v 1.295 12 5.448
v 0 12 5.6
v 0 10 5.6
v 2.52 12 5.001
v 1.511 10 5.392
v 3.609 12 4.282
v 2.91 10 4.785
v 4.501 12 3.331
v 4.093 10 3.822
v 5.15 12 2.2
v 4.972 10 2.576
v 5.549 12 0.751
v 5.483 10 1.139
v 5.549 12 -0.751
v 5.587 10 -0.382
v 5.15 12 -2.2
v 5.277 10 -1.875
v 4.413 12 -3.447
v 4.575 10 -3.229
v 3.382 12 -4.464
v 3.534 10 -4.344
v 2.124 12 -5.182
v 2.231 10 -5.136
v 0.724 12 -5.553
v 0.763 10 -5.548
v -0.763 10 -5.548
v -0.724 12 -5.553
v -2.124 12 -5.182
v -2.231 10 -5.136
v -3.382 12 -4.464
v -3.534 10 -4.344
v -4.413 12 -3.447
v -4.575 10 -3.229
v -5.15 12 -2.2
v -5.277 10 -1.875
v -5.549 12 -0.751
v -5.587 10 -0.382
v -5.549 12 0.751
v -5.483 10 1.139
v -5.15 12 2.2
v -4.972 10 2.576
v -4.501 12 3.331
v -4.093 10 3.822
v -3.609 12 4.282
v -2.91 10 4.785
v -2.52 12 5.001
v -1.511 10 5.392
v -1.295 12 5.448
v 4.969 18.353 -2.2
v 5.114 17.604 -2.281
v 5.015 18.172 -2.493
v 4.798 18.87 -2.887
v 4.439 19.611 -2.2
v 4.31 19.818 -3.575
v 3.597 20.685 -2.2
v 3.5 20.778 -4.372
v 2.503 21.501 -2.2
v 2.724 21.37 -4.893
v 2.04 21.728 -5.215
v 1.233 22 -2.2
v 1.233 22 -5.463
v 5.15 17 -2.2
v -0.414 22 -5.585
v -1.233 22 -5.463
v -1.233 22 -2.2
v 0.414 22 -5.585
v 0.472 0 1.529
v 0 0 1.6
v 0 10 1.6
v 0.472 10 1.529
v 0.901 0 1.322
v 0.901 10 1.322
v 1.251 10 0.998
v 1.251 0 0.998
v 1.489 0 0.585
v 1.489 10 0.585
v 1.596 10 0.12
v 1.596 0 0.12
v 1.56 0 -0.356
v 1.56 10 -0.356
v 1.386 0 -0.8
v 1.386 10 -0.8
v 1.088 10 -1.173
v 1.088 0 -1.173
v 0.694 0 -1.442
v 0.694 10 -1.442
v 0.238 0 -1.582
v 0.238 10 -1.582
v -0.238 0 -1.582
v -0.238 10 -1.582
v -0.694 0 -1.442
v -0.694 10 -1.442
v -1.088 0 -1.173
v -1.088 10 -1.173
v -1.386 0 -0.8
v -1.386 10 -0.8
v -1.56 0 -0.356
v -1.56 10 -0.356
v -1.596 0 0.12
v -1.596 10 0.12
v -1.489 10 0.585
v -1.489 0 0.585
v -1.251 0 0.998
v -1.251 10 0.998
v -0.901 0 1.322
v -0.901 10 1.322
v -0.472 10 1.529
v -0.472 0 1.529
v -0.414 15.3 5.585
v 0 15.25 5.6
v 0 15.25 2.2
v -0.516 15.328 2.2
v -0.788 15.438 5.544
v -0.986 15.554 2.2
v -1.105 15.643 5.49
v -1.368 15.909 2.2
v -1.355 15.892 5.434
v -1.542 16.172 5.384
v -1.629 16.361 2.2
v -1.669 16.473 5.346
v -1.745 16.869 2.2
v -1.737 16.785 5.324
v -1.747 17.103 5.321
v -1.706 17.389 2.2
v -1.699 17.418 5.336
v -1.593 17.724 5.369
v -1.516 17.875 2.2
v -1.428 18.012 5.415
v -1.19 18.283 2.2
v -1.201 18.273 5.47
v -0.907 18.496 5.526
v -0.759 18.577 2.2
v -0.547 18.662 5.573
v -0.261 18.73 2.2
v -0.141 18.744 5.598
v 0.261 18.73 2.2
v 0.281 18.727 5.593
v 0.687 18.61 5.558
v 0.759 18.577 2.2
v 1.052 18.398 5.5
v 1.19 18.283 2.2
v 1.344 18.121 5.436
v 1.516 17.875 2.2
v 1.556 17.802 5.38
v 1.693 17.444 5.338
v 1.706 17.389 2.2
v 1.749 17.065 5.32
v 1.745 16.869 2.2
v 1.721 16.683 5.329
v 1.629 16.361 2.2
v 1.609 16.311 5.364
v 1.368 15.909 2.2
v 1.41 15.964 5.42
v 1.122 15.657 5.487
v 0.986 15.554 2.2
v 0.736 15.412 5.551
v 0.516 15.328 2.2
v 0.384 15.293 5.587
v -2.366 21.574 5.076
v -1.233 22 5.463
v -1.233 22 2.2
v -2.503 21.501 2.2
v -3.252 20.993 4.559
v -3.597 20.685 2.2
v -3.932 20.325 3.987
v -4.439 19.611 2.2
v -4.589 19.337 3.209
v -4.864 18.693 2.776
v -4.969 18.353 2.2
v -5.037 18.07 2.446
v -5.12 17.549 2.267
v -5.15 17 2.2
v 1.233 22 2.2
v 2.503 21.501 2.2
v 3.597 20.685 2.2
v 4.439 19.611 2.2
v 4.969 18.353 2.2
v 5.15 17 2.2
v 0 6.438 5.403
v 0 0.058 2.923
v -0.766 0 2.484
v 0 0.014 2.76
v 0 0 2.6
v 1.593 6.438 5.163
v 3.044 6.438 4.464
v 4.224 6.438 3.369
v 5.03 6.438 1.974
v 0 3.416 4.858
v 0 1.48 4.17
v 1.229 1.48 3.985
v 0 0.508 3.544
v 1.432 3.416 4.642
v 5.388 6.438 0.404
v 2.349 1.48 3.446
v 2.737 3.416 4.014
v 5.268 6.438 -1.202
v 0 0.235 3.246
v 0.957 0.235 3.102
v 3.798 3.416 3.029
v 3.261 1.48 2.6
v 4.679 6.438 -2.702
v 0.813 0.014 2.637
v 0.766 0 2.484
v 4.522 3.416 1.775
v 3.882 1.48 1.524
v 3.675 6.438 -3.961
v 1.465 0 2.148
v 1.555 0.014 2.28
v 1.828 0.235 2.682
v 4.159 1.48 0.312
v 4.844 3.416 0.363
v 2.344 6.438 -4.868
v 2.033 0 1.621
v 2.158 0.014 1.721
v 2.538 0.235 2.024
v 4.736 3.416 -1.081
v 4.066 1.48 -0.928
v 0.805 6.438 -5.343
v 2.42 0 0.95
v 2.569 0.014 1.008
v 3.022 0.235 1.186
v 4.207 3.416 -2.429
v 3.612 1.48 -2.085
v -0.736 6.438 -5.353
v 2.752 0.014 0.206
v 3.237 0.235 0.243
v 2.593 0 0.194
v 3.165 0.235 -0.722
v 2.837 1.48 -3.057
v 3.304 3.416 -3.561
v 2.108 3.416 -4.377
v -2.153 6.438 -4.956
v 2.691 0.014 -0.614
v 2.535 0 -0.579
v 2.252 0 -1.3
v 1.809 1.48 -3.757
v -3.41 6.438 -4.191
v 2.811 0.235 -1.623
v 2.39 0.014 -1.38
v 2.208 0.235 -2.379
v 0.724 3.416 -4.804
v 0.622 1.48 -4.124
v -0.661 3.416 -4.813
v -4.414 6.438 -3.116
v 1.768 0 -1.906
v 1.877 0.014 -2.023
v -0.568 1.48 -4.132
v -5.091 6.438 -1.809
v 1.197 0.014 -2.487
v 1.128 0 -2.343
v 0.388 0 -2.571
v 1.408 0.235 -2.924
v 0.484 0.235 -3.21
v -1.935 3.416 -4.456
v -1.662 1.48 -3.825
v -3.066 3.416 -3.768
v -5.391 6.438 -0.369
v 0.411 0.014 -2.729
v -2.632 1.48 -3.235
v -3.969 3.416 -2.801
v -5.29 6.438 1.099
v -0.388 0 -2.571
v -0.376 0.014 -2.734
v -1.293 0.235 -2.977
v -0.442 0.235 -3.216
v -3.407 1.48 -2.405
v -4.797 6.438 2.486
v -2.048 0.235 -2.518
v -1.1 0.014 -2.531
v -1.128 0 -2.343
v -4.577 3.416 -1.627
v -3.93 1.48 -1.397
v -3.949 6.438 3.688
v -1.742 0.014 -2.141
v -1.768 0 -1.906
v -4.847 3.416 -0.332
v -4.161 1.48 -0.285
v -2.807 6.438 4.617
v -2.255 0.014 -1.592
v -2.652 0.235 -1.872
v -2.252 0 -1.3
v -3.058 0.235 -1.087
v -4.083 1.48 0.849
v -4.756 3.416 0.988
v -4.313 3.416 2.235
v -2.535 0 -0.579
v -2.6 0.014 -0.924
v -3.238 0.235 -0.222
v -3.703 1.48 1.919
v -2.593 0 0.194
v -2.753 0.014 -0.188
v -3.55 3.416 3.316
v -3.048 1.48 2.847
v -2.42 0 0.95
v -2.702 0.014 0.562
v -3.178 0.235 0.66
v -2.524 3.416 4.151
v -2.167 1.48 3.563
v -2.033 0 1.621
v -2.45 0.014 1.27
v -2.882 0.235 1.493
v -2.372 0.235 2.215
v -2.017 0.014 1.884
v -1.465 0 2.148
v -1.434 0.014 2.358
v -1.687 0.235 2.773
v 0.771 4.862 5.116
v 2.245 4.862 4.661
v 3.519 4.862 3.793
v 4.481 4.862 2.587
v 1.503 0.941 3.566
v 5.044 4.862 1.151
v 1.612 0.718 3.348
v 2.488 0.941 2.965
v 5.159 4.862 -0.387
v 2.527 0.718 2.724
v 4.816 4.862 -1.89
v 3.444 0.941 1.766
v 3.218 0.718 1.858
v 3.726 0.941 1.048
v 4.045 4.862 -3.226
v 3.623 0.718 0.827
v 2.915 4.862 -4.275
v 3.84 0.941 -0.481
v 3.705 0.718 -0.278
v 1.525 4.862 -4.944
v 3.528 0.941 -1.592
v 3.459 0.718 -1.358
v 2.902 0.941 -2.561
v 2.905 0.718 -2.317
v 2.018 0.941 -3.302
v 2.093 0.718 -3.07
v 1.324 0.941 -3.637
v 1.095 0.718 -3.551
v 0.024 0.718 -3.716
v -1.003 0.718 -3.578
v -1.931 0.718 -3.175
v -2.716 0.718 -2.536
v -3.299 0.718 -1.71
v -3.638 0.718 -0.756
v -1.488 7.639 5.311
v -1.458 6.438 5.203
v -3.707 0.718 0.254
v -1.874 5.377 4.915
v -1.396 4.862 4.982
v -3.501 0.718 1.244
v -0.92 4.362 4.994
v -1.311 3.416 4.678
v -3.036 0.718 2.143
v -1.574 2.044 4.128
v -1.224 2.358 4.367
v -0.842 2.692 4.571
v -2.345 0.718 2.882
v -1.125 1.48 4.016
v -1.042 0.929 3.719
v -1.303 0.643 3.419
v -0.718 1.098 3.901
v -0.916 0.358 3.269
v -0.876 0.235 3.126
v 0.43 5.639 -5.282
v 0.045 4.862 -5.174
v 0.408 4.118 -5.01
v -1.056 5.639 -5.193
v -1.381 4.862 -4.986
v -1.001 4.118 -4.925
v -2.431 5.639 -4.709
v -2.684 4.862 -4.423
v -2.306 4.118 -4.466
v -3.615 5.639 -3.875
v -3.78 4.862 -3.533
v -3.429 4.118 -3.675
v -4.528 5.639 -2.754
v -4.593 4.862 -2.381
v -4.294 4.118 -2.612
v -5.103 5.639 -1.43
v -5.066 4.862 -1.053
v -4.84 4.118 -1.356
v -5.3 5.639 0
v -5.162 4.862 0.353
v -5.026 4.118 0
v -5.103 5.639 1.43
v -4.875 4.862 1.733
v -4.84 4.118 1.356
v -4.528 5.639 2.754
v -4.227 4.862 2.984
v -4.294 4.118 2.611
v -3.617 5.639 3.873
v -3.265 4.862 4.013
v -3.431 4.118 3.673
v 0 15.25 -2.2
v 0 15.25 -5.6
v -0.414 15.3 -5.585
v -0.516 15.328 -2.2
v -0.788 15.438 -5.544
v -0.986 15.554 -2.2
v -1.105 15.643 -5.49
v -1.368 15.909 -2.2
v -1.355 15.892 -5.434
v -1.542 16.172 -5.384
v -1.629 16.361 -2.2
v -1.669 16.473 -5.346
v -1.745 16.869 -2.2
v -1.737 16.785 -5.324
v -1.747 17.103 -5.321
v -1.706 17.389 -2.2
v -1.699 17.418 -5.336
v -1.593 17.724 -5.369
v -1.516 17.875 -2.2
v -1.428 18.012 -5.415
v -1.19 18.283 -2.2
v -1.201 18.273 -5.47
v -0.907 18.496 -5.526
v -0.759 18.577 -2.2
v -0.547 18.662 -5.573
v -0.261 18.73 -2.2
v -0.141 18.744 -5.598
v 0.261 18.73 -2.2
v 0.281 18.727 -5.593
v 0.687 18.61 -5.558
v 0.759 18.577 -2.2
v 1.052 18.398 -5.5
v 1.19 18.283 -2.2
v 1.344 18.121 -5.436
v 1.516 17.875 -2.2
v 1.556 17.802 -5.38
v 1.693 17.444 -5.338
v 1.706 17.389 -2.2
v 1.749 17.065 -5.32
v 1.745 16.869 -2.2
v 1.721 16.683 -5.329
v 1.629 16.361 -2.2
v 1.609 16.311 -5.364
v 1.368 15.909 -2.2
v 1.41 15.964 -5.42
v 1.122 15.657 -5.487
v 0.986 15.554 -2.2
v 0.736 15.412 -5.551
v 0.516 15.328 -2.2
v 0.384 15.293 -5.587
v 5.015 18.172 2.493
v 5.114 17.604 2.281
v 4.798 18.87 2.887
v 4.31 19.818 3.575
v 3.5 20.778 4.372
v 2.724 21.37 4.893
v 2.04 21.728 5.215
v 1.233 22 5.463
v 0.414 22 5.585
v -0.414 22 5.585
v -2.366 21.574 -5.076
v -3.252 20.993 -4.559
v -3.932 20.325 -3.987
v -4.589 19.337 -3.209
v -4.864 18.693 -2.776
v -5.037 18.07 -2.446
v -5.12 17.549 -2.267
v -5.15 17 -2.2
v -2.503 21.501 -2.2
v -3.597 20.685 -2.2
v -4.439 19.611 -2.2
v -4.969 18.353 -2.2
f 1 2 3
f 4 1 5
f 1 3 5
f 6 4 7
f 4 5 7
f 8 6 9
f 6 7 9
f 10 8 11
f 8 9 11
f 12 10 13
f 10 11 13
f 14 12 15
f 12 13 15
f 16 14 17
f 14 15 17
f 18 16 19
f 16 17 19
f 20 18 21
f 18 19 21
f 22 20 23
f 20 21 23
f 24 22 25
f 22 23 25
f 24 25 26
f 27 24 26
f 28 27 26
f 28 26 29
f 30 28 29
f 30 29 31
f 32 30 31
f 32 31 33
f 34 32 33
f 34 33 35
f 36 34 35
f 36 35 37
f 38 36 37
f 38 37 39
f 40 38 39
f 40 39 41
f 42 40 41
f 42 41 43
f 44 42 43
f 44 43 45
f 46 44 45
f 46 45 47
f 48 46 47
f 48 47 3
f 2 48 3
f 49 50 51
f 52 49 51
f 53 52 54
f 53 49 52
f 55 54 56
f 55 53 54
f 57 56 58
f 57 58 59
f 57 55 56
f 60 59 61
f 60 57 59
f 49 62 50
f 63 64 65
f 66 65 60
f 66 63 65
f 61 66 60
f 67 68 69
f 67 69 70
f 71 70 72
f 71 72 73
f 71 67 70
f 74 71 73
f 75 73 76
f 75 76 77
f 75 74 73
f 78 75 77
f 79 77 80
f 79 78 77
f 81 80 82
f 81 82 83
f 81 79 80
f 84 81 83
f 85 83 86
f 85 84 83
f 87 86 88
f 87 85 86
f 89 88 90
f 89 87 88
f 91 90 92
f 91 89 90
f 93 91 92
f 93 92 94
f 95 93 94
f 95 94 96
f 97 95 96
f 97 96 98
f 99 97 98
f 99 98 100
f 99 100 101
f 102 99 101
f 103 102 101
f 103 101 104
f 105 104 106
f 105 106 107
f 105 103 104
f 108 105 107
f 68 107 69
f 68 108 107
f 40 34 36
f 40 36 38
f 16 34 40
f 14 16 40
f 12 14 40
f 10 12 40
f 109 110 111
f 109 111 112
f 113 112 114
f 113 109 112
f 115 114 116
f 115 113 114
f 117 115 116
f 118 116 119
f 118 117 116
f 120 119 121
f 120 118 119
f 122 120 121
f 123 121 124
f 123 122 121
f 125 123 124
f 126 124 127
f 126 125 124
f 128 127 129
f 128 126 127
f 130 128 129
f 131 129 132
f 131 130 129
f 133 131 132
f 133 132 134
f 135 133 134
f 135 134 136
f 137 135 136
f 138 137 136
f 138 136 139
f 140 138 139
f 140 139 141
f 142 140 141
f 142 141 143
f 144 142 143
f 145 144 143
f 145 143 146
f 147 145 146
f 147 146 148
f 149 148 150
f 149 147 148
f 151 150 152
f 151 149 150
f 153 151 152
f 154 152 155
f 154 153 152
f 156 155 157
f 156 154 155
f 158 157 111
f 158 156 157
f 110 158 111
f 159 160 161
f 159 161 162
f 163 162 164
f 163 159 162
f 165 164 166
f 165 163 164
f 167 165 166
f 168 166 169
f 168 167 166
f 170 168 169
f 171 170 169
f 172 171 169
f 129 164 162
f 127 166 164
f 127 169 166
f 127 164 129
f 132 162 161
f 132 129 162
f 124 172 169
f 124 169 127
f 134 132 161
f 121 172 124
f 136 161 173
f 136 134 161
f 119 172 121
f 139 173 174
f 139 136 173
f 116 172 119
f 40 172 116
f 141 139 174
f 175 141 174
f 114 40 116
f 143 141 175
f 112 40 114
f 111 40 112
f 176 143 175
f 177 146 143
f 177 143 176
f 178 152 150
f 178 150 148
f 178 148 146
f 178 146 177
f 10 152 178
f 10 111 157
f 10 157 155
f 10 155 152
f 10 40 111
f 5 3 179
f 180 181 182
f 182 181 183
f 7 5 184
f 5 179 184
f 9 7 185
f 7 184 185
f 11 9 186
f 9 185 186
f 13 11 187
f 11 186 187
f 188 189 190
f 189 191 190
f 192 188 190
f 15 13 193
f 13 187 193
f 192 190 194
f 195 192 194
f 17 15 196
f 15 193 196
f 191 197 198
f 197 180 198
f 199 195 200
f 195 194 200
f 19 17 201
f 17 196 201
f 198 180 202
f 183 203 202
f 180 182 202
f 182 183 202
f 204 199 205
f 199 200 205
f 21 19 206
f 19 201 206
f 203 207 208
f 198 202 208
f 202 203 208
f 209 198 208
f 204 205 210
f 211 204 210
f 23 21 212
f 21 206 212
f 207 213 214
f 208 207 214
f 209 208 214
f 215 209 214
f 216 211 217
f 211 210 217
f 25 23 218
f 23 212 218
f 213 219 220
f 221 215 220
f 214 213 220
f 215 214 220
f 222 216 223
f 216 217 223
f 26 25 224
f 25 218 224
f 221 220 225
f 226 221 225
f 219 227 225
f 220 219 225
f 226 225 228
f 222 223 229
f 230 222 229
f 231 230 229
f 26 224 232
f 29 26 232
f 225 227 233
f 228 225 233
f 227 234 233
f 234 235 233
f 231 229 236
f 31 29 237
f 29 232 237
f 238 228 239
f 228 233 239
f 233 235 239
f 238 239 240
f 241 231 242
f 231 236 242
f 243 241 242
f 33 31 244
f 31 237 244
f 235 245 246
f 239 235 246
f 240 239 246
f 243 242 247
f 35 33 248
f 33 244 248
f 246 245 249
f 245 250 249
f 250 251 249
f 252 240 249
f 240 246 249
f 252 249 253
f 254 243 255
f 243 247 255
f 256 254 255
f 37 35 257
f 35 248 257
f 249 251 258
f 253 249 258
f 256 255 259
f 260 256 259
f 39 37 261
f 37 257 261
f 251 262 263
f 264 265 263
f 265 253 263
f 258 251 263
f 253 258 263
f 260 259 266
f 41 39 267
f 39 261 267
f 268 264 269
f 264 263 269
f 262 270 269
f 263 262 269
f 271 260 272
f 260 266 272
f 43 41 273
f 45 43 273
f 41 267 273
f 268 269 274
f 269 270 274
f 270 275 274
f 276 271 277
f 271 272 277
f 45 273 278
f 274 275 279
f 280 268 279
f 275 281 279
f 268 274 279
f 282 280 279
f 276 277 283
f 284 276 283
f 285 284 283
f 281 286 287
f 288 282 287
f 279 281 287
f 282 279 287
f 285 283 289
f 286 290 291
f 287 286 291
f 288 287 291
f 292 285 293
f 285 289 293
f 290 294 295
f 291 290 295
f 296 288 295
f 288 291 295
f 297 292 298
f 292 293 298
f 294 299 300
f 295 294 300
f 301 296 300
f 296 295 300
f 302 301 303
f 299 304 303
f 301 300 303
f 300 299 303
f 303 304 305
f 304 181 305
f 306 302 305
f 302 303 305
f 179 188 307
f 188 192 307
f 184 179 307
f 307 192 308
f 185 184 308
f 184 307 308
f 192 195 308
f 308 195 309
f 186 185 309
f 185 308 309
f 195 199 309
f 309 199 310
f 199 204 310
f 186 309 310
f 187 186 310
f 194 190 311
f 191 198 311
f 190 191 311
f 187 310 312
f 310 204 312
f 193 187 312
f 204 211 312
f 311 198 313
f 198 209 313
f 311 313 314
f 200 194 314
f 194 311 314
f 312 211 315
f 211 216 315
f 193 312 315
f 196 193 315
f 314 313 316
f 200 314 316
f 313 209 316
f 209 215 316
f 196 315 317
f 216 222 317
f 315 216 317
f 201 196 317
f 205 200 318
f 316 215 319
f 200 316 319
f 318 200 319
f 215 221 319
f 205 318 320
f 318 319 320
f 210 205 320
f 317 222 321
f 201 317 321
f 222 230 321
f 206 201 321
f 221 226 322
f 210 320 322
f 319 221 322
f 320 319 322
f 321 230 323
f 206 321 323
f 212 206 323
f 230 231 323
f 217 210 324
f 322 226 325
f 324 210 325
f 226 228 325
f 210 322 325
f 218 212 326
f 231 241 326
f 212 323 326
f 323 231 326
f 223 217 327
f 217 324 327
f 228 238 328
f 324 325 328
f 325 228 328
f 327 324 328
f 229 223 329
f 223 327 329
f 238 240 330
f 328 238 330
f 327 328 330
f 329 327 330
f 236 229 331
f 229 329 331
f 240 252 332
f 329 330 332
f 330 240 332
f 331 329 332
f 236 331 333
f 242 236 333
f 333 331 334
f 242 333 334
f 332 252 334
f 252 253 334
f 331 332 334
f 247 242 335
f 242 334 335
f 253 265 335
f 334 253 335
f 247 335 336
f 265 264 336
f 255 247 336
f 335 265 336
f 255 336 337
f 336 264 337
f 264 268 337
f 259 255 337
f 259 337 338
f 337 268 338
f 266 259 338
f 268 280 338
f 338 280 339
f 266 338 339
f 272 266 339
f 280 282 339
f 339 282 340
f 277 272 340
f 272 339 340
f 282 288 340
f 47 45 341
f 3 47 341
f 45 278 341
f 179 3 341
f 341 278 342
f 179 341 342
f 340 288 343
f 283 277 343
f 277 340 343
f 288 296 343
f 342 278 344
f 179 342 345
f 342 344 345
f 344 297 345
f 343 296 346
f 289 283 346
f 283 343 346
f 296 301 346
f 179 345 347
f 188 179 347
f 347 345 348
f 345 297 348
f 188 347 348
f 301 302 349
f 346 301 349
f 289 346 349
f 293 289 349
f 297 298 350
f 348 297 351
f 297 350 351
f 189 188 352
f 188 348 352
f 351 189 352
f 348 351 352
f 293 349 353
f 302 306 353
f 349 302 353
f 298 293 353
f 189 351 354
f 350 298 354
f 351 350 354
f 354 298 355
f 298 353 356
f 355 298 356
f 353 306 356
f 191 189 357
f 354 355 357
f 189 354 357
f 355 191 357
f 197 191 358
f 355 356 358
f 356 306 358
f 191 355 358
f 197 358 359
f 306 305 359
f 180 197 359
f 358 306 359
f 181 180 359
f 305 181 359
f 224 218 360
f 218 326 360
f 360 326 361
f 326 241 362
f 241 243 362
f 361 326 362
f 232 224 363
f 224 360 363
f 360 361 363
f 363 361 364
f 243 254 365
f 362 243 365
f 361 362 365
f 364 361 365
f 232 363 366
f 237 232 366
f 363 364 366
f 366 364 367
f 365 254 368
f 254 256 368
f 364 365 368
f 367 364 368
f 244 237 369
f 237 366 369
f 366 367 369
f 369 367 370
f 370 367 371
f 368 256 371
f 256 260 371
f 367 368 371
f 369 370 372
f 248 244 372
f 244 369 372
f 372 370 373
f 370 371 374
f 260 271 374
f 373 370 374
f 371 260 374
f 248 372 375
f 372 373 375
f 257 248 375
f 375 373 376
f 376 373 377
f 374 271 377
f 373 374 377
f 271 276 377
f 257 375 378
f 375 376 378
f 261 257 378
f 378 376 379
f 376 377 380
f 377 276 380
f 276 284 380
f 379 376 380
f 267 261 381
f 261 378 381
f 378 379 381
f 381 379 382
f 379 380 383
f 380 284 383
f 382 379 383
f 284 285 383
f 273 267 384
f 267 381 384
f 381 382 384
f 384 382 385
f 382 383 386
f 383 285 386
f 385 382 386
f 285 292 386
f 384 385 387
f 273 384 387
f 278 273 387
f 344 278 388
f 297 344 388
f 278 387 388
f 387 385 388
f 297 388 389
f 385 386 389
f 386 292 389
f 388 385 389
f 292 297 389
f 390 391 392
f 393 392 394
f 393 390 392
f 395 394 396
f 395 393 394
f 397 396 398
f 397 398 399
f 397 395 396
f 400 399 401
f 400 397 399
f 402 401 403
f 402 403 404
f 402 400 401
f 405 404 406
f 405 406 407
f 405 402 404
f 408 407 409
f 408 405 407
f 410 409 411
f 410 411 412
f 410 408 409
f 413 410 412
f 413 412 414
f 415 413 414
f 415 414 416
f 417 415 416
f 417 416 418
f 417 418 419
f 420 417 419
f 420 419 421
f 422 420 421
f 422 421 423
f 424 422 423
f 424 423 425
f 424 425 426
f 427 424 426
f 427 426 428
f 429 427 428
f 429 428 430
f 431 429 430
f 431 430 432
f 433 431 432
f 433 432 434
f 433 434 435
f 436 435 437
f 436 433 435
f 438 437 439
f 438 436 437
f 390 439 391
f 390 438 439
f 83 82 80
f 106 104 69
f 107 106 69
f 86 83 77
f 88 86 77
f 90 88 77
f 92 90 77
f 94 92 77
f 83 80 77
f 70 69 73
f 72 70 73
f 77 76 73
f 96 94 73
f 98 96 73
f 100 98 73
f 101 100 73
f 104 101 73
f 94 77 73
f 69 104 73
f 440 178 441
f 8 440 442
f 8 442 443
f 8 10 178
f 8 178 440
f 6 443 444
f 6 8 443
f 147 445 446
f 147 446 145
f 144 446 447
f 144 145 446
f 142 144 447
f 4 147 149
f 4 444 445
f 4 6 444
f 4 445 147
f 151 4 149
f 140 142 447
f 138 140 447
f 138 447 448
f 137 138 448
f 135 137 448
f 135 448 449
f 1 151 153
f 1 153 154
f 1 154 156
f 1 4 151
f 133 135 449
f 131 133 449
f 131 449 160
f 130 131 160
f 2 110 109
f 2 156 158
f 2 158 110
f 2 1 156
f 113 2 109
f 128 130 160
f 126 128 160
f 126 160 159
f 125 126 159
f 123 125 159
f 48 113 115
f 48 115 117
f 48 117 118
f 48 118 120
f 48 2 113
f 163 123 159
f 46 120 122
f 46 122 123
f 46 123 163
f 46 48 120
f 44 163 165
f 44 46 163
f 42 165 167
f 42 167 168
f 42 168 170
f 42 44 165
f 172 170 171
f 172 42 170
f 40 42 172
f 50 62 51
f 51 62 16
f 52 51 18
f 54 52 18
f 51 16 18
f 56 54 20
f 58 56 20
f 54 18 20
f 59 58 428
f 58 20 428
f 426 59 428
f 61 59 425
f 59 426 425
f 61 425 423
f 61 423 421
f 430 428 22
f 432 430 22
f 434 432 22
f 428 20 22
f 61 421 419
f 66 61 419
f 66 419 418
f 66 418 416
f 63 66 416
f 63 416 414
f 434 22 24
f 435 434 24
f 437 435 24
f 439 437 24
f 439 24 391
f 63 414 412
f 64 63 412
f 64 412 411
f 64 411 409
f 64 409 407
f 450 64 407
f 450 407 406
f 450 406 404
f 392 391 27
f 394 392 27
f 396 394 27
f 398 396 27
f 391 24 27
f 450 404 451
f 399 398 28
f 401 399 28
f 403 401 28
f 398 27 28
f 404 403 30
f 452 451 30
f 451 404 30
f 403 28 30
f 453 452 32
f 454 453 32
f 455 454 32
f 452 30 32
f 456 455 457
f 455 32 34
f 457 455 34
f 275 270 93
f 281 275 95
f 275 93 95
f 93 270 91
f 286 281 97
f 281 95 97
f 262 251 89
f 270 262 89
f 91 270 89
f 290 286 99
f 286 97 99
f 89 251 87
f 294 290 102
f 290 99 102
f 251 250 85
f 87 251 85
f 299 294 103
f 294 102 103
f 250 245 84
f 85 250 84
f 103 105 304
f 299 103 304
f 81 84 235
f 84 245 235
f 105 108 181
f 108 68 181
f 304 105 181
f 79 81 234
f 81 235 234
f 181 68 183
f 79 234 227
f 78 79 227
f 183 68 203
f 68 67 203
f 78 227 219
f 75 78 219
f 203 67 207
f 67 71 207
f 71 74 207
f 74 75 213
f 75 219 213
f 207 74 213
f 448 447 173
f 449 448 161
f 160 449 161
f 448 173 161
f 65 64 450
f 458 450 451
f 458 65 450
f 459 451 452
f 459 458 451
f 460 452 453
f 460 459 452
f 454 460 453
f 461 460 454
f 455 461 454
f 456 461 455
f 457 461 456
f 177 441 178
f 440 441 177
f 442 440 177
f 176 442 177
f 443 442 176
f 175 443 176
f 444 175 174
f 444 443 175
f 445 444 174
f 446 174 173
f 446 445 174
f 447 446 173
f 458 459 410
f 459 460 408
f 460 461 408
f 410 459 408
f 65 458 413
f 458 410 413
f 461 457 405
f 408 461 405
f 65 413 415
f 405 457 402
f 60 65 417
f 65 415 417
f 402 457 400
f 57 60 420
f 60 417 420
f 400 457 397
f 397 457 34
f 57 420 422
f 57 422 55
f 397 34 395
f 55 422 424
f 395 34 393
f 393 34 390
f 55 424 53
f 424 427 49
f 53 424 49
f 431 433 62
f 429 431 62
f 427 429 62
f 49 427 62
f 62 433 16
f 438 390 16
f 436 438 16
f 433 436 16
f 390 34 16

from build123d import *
from build123d.topology import SkipClean

# Parameters (mm, degrees)
SKETCH1_R               = 5.6
SKETCH1_R_2             = 1.6
BOSS_EXTRUDE1_DEPTH     = 10
SKETCH2_R               = 5.6
BOSS_EXTRUDE2_DEPTH     = 2
BOSS_EXTRUDE3_DEPTH     = 10
CUT_EXTRUDE1_DEPTH      = 25.004166
CUT_EXTRUDE1_DEPTH_BACK = 25.004166
SKETCH4_R               = 1.75
FILLET1_SIZE            = 10
FILLET1_SIZE_2          = 3


with BuildPart() as part:
    # Sketch1 → Boss-Extrude1 (new body)
    with BuildSketch(Plane(origin=(0, 0, 0), x_dir=(1, 0, 0), z_dir=(0, 1, 0))):
        with Locations(Location((0, 0, 0), (0, 0, 270))):
            Circle(SKETCH1_R)
        with Locations(Location((0, 0, 0), (0, 0, 270))):
            Circle(SKETCH1_R_2, mode=Mode.SUBTRACT)
    extrude(amount=BOSS_EXTRUDE1_DEPTH)

    # Sketch2 → Boss-Extrude2 (add)
    with BuildSketch(Plane(origin=(0, 10, 0), x_dir=(1, 0, 0), z_dir=(0, 1, 0))):
        with Locations(Location((0, 0, 0), (0, 0, 270))):
            Circle(SKETCH2_R)
    extrude(amount=BOSS_EXTRUDE2_DEPTH)

    # Sketch3 → Boss-Extrude3 (add)
    with BuildSketch(Plane(origin=(0, 12, 0), x_dir=(1, 0, 0), z_dir=(0, 1, 0))):
        with BuildLine():
            Line((-5.149757, 2.2), (5.149757, 2.2))
            ThreePointArc((5.149757, 2.2), (0, 5.6), (-5.149757, 2.2))
        make_face()
        with BuildLine():
            Line((-5.149757, -2.2), (5.149757, -2.2))
            ThreePointArc((5.149757, -2.2), (0, -5.6), (-5.149757, -2.2))
        make_face()
    extrude(amount=BOSS_EXTRUDE3_DEPTH)

    # Sketch4 → Cut-Extrude1 (cut, two sides: drawn at the far end of the back side and taken through both)
    with SkipClean():  # the faces are left unmerged after this step: merging them gives an invalid solid
        with BuildSketch(Plane(origin=(0, 0, 2.2), x_dir=(-1, 0, 0), z_dir=(0, 0, -1)).offset(-CUT_EXTRUDE1_DEPTH_BACK)):
            with BuildLine():
                Line((5.149757, 22.1), (5.149757, 22))
                Line((5.149757, 22), (1.232883, 22))
                ThreePointArc((1.232883, 22), (4.053952, 20.175764), (5.149757, 17))
                Line((5.149757, 17), (5.149757, 12))
                Line((5.149757, 12), (5.249757, 12))
                Line((5.249757, 12), (5.249757, 22.1))
                Line((5.249757, 22.1), (5.149757, 22.1))
            make_face()
            with BuildLine():
                ThreePointArc((-5.149757, 17), (-4.053952, 20.175764), (-1.232883, 22))
                Line((-1.232883, 22), (-5.149757, 22))
                Line((-5.149757, 22), (-5.149757, 22.1))
                Line((-5.149757, 22.1), (-5.249757, 22.1))
                Line((-5.249757, 22.1), (-5.249757, 12))
                Line((-5.249757, 12), (-5.149757, 12))
                Line((-5.149757, 12), (-5.149757, 17))
            make_face()
            with Locations(Location((0, 17, 0), (0, 0, 270))):
                Circle(SKETCH4_R)
        extrude(amount=CUT_EXTRUDE1_DEPTH + CUT_EXTRUDE1_DEPTH_BACK, mode=Mode.SUBTRACT)

    # Fillet1
    # an asymmetric fillet: 10, 3 mm, written as the material it takes off along each edge
    with BuildSketch(Plane(origin=(0, 0, 0), x_dir=(0, 0, 1), z_dir=(-1, 0, 0))) as fillet1_piece_1:
        with BuildLine():
            Bezier((5.6, FILLET1_SIZE), (5.6, 0), (5.6 - FILLET1_SIZE_2, 0), weights=[1, 0.707107, 1])
            Line((5.6 - FILLET1_SIZE_2, 0), (5.6, 0))
            Line((5.6, 0), (5.6, FILLET1_SIZE))
        make_face()
    revolve(axis=Axis((0, 0, 0), (0, 1, 0)), mode=Mode.SUBTRACT)


solid = part.part
